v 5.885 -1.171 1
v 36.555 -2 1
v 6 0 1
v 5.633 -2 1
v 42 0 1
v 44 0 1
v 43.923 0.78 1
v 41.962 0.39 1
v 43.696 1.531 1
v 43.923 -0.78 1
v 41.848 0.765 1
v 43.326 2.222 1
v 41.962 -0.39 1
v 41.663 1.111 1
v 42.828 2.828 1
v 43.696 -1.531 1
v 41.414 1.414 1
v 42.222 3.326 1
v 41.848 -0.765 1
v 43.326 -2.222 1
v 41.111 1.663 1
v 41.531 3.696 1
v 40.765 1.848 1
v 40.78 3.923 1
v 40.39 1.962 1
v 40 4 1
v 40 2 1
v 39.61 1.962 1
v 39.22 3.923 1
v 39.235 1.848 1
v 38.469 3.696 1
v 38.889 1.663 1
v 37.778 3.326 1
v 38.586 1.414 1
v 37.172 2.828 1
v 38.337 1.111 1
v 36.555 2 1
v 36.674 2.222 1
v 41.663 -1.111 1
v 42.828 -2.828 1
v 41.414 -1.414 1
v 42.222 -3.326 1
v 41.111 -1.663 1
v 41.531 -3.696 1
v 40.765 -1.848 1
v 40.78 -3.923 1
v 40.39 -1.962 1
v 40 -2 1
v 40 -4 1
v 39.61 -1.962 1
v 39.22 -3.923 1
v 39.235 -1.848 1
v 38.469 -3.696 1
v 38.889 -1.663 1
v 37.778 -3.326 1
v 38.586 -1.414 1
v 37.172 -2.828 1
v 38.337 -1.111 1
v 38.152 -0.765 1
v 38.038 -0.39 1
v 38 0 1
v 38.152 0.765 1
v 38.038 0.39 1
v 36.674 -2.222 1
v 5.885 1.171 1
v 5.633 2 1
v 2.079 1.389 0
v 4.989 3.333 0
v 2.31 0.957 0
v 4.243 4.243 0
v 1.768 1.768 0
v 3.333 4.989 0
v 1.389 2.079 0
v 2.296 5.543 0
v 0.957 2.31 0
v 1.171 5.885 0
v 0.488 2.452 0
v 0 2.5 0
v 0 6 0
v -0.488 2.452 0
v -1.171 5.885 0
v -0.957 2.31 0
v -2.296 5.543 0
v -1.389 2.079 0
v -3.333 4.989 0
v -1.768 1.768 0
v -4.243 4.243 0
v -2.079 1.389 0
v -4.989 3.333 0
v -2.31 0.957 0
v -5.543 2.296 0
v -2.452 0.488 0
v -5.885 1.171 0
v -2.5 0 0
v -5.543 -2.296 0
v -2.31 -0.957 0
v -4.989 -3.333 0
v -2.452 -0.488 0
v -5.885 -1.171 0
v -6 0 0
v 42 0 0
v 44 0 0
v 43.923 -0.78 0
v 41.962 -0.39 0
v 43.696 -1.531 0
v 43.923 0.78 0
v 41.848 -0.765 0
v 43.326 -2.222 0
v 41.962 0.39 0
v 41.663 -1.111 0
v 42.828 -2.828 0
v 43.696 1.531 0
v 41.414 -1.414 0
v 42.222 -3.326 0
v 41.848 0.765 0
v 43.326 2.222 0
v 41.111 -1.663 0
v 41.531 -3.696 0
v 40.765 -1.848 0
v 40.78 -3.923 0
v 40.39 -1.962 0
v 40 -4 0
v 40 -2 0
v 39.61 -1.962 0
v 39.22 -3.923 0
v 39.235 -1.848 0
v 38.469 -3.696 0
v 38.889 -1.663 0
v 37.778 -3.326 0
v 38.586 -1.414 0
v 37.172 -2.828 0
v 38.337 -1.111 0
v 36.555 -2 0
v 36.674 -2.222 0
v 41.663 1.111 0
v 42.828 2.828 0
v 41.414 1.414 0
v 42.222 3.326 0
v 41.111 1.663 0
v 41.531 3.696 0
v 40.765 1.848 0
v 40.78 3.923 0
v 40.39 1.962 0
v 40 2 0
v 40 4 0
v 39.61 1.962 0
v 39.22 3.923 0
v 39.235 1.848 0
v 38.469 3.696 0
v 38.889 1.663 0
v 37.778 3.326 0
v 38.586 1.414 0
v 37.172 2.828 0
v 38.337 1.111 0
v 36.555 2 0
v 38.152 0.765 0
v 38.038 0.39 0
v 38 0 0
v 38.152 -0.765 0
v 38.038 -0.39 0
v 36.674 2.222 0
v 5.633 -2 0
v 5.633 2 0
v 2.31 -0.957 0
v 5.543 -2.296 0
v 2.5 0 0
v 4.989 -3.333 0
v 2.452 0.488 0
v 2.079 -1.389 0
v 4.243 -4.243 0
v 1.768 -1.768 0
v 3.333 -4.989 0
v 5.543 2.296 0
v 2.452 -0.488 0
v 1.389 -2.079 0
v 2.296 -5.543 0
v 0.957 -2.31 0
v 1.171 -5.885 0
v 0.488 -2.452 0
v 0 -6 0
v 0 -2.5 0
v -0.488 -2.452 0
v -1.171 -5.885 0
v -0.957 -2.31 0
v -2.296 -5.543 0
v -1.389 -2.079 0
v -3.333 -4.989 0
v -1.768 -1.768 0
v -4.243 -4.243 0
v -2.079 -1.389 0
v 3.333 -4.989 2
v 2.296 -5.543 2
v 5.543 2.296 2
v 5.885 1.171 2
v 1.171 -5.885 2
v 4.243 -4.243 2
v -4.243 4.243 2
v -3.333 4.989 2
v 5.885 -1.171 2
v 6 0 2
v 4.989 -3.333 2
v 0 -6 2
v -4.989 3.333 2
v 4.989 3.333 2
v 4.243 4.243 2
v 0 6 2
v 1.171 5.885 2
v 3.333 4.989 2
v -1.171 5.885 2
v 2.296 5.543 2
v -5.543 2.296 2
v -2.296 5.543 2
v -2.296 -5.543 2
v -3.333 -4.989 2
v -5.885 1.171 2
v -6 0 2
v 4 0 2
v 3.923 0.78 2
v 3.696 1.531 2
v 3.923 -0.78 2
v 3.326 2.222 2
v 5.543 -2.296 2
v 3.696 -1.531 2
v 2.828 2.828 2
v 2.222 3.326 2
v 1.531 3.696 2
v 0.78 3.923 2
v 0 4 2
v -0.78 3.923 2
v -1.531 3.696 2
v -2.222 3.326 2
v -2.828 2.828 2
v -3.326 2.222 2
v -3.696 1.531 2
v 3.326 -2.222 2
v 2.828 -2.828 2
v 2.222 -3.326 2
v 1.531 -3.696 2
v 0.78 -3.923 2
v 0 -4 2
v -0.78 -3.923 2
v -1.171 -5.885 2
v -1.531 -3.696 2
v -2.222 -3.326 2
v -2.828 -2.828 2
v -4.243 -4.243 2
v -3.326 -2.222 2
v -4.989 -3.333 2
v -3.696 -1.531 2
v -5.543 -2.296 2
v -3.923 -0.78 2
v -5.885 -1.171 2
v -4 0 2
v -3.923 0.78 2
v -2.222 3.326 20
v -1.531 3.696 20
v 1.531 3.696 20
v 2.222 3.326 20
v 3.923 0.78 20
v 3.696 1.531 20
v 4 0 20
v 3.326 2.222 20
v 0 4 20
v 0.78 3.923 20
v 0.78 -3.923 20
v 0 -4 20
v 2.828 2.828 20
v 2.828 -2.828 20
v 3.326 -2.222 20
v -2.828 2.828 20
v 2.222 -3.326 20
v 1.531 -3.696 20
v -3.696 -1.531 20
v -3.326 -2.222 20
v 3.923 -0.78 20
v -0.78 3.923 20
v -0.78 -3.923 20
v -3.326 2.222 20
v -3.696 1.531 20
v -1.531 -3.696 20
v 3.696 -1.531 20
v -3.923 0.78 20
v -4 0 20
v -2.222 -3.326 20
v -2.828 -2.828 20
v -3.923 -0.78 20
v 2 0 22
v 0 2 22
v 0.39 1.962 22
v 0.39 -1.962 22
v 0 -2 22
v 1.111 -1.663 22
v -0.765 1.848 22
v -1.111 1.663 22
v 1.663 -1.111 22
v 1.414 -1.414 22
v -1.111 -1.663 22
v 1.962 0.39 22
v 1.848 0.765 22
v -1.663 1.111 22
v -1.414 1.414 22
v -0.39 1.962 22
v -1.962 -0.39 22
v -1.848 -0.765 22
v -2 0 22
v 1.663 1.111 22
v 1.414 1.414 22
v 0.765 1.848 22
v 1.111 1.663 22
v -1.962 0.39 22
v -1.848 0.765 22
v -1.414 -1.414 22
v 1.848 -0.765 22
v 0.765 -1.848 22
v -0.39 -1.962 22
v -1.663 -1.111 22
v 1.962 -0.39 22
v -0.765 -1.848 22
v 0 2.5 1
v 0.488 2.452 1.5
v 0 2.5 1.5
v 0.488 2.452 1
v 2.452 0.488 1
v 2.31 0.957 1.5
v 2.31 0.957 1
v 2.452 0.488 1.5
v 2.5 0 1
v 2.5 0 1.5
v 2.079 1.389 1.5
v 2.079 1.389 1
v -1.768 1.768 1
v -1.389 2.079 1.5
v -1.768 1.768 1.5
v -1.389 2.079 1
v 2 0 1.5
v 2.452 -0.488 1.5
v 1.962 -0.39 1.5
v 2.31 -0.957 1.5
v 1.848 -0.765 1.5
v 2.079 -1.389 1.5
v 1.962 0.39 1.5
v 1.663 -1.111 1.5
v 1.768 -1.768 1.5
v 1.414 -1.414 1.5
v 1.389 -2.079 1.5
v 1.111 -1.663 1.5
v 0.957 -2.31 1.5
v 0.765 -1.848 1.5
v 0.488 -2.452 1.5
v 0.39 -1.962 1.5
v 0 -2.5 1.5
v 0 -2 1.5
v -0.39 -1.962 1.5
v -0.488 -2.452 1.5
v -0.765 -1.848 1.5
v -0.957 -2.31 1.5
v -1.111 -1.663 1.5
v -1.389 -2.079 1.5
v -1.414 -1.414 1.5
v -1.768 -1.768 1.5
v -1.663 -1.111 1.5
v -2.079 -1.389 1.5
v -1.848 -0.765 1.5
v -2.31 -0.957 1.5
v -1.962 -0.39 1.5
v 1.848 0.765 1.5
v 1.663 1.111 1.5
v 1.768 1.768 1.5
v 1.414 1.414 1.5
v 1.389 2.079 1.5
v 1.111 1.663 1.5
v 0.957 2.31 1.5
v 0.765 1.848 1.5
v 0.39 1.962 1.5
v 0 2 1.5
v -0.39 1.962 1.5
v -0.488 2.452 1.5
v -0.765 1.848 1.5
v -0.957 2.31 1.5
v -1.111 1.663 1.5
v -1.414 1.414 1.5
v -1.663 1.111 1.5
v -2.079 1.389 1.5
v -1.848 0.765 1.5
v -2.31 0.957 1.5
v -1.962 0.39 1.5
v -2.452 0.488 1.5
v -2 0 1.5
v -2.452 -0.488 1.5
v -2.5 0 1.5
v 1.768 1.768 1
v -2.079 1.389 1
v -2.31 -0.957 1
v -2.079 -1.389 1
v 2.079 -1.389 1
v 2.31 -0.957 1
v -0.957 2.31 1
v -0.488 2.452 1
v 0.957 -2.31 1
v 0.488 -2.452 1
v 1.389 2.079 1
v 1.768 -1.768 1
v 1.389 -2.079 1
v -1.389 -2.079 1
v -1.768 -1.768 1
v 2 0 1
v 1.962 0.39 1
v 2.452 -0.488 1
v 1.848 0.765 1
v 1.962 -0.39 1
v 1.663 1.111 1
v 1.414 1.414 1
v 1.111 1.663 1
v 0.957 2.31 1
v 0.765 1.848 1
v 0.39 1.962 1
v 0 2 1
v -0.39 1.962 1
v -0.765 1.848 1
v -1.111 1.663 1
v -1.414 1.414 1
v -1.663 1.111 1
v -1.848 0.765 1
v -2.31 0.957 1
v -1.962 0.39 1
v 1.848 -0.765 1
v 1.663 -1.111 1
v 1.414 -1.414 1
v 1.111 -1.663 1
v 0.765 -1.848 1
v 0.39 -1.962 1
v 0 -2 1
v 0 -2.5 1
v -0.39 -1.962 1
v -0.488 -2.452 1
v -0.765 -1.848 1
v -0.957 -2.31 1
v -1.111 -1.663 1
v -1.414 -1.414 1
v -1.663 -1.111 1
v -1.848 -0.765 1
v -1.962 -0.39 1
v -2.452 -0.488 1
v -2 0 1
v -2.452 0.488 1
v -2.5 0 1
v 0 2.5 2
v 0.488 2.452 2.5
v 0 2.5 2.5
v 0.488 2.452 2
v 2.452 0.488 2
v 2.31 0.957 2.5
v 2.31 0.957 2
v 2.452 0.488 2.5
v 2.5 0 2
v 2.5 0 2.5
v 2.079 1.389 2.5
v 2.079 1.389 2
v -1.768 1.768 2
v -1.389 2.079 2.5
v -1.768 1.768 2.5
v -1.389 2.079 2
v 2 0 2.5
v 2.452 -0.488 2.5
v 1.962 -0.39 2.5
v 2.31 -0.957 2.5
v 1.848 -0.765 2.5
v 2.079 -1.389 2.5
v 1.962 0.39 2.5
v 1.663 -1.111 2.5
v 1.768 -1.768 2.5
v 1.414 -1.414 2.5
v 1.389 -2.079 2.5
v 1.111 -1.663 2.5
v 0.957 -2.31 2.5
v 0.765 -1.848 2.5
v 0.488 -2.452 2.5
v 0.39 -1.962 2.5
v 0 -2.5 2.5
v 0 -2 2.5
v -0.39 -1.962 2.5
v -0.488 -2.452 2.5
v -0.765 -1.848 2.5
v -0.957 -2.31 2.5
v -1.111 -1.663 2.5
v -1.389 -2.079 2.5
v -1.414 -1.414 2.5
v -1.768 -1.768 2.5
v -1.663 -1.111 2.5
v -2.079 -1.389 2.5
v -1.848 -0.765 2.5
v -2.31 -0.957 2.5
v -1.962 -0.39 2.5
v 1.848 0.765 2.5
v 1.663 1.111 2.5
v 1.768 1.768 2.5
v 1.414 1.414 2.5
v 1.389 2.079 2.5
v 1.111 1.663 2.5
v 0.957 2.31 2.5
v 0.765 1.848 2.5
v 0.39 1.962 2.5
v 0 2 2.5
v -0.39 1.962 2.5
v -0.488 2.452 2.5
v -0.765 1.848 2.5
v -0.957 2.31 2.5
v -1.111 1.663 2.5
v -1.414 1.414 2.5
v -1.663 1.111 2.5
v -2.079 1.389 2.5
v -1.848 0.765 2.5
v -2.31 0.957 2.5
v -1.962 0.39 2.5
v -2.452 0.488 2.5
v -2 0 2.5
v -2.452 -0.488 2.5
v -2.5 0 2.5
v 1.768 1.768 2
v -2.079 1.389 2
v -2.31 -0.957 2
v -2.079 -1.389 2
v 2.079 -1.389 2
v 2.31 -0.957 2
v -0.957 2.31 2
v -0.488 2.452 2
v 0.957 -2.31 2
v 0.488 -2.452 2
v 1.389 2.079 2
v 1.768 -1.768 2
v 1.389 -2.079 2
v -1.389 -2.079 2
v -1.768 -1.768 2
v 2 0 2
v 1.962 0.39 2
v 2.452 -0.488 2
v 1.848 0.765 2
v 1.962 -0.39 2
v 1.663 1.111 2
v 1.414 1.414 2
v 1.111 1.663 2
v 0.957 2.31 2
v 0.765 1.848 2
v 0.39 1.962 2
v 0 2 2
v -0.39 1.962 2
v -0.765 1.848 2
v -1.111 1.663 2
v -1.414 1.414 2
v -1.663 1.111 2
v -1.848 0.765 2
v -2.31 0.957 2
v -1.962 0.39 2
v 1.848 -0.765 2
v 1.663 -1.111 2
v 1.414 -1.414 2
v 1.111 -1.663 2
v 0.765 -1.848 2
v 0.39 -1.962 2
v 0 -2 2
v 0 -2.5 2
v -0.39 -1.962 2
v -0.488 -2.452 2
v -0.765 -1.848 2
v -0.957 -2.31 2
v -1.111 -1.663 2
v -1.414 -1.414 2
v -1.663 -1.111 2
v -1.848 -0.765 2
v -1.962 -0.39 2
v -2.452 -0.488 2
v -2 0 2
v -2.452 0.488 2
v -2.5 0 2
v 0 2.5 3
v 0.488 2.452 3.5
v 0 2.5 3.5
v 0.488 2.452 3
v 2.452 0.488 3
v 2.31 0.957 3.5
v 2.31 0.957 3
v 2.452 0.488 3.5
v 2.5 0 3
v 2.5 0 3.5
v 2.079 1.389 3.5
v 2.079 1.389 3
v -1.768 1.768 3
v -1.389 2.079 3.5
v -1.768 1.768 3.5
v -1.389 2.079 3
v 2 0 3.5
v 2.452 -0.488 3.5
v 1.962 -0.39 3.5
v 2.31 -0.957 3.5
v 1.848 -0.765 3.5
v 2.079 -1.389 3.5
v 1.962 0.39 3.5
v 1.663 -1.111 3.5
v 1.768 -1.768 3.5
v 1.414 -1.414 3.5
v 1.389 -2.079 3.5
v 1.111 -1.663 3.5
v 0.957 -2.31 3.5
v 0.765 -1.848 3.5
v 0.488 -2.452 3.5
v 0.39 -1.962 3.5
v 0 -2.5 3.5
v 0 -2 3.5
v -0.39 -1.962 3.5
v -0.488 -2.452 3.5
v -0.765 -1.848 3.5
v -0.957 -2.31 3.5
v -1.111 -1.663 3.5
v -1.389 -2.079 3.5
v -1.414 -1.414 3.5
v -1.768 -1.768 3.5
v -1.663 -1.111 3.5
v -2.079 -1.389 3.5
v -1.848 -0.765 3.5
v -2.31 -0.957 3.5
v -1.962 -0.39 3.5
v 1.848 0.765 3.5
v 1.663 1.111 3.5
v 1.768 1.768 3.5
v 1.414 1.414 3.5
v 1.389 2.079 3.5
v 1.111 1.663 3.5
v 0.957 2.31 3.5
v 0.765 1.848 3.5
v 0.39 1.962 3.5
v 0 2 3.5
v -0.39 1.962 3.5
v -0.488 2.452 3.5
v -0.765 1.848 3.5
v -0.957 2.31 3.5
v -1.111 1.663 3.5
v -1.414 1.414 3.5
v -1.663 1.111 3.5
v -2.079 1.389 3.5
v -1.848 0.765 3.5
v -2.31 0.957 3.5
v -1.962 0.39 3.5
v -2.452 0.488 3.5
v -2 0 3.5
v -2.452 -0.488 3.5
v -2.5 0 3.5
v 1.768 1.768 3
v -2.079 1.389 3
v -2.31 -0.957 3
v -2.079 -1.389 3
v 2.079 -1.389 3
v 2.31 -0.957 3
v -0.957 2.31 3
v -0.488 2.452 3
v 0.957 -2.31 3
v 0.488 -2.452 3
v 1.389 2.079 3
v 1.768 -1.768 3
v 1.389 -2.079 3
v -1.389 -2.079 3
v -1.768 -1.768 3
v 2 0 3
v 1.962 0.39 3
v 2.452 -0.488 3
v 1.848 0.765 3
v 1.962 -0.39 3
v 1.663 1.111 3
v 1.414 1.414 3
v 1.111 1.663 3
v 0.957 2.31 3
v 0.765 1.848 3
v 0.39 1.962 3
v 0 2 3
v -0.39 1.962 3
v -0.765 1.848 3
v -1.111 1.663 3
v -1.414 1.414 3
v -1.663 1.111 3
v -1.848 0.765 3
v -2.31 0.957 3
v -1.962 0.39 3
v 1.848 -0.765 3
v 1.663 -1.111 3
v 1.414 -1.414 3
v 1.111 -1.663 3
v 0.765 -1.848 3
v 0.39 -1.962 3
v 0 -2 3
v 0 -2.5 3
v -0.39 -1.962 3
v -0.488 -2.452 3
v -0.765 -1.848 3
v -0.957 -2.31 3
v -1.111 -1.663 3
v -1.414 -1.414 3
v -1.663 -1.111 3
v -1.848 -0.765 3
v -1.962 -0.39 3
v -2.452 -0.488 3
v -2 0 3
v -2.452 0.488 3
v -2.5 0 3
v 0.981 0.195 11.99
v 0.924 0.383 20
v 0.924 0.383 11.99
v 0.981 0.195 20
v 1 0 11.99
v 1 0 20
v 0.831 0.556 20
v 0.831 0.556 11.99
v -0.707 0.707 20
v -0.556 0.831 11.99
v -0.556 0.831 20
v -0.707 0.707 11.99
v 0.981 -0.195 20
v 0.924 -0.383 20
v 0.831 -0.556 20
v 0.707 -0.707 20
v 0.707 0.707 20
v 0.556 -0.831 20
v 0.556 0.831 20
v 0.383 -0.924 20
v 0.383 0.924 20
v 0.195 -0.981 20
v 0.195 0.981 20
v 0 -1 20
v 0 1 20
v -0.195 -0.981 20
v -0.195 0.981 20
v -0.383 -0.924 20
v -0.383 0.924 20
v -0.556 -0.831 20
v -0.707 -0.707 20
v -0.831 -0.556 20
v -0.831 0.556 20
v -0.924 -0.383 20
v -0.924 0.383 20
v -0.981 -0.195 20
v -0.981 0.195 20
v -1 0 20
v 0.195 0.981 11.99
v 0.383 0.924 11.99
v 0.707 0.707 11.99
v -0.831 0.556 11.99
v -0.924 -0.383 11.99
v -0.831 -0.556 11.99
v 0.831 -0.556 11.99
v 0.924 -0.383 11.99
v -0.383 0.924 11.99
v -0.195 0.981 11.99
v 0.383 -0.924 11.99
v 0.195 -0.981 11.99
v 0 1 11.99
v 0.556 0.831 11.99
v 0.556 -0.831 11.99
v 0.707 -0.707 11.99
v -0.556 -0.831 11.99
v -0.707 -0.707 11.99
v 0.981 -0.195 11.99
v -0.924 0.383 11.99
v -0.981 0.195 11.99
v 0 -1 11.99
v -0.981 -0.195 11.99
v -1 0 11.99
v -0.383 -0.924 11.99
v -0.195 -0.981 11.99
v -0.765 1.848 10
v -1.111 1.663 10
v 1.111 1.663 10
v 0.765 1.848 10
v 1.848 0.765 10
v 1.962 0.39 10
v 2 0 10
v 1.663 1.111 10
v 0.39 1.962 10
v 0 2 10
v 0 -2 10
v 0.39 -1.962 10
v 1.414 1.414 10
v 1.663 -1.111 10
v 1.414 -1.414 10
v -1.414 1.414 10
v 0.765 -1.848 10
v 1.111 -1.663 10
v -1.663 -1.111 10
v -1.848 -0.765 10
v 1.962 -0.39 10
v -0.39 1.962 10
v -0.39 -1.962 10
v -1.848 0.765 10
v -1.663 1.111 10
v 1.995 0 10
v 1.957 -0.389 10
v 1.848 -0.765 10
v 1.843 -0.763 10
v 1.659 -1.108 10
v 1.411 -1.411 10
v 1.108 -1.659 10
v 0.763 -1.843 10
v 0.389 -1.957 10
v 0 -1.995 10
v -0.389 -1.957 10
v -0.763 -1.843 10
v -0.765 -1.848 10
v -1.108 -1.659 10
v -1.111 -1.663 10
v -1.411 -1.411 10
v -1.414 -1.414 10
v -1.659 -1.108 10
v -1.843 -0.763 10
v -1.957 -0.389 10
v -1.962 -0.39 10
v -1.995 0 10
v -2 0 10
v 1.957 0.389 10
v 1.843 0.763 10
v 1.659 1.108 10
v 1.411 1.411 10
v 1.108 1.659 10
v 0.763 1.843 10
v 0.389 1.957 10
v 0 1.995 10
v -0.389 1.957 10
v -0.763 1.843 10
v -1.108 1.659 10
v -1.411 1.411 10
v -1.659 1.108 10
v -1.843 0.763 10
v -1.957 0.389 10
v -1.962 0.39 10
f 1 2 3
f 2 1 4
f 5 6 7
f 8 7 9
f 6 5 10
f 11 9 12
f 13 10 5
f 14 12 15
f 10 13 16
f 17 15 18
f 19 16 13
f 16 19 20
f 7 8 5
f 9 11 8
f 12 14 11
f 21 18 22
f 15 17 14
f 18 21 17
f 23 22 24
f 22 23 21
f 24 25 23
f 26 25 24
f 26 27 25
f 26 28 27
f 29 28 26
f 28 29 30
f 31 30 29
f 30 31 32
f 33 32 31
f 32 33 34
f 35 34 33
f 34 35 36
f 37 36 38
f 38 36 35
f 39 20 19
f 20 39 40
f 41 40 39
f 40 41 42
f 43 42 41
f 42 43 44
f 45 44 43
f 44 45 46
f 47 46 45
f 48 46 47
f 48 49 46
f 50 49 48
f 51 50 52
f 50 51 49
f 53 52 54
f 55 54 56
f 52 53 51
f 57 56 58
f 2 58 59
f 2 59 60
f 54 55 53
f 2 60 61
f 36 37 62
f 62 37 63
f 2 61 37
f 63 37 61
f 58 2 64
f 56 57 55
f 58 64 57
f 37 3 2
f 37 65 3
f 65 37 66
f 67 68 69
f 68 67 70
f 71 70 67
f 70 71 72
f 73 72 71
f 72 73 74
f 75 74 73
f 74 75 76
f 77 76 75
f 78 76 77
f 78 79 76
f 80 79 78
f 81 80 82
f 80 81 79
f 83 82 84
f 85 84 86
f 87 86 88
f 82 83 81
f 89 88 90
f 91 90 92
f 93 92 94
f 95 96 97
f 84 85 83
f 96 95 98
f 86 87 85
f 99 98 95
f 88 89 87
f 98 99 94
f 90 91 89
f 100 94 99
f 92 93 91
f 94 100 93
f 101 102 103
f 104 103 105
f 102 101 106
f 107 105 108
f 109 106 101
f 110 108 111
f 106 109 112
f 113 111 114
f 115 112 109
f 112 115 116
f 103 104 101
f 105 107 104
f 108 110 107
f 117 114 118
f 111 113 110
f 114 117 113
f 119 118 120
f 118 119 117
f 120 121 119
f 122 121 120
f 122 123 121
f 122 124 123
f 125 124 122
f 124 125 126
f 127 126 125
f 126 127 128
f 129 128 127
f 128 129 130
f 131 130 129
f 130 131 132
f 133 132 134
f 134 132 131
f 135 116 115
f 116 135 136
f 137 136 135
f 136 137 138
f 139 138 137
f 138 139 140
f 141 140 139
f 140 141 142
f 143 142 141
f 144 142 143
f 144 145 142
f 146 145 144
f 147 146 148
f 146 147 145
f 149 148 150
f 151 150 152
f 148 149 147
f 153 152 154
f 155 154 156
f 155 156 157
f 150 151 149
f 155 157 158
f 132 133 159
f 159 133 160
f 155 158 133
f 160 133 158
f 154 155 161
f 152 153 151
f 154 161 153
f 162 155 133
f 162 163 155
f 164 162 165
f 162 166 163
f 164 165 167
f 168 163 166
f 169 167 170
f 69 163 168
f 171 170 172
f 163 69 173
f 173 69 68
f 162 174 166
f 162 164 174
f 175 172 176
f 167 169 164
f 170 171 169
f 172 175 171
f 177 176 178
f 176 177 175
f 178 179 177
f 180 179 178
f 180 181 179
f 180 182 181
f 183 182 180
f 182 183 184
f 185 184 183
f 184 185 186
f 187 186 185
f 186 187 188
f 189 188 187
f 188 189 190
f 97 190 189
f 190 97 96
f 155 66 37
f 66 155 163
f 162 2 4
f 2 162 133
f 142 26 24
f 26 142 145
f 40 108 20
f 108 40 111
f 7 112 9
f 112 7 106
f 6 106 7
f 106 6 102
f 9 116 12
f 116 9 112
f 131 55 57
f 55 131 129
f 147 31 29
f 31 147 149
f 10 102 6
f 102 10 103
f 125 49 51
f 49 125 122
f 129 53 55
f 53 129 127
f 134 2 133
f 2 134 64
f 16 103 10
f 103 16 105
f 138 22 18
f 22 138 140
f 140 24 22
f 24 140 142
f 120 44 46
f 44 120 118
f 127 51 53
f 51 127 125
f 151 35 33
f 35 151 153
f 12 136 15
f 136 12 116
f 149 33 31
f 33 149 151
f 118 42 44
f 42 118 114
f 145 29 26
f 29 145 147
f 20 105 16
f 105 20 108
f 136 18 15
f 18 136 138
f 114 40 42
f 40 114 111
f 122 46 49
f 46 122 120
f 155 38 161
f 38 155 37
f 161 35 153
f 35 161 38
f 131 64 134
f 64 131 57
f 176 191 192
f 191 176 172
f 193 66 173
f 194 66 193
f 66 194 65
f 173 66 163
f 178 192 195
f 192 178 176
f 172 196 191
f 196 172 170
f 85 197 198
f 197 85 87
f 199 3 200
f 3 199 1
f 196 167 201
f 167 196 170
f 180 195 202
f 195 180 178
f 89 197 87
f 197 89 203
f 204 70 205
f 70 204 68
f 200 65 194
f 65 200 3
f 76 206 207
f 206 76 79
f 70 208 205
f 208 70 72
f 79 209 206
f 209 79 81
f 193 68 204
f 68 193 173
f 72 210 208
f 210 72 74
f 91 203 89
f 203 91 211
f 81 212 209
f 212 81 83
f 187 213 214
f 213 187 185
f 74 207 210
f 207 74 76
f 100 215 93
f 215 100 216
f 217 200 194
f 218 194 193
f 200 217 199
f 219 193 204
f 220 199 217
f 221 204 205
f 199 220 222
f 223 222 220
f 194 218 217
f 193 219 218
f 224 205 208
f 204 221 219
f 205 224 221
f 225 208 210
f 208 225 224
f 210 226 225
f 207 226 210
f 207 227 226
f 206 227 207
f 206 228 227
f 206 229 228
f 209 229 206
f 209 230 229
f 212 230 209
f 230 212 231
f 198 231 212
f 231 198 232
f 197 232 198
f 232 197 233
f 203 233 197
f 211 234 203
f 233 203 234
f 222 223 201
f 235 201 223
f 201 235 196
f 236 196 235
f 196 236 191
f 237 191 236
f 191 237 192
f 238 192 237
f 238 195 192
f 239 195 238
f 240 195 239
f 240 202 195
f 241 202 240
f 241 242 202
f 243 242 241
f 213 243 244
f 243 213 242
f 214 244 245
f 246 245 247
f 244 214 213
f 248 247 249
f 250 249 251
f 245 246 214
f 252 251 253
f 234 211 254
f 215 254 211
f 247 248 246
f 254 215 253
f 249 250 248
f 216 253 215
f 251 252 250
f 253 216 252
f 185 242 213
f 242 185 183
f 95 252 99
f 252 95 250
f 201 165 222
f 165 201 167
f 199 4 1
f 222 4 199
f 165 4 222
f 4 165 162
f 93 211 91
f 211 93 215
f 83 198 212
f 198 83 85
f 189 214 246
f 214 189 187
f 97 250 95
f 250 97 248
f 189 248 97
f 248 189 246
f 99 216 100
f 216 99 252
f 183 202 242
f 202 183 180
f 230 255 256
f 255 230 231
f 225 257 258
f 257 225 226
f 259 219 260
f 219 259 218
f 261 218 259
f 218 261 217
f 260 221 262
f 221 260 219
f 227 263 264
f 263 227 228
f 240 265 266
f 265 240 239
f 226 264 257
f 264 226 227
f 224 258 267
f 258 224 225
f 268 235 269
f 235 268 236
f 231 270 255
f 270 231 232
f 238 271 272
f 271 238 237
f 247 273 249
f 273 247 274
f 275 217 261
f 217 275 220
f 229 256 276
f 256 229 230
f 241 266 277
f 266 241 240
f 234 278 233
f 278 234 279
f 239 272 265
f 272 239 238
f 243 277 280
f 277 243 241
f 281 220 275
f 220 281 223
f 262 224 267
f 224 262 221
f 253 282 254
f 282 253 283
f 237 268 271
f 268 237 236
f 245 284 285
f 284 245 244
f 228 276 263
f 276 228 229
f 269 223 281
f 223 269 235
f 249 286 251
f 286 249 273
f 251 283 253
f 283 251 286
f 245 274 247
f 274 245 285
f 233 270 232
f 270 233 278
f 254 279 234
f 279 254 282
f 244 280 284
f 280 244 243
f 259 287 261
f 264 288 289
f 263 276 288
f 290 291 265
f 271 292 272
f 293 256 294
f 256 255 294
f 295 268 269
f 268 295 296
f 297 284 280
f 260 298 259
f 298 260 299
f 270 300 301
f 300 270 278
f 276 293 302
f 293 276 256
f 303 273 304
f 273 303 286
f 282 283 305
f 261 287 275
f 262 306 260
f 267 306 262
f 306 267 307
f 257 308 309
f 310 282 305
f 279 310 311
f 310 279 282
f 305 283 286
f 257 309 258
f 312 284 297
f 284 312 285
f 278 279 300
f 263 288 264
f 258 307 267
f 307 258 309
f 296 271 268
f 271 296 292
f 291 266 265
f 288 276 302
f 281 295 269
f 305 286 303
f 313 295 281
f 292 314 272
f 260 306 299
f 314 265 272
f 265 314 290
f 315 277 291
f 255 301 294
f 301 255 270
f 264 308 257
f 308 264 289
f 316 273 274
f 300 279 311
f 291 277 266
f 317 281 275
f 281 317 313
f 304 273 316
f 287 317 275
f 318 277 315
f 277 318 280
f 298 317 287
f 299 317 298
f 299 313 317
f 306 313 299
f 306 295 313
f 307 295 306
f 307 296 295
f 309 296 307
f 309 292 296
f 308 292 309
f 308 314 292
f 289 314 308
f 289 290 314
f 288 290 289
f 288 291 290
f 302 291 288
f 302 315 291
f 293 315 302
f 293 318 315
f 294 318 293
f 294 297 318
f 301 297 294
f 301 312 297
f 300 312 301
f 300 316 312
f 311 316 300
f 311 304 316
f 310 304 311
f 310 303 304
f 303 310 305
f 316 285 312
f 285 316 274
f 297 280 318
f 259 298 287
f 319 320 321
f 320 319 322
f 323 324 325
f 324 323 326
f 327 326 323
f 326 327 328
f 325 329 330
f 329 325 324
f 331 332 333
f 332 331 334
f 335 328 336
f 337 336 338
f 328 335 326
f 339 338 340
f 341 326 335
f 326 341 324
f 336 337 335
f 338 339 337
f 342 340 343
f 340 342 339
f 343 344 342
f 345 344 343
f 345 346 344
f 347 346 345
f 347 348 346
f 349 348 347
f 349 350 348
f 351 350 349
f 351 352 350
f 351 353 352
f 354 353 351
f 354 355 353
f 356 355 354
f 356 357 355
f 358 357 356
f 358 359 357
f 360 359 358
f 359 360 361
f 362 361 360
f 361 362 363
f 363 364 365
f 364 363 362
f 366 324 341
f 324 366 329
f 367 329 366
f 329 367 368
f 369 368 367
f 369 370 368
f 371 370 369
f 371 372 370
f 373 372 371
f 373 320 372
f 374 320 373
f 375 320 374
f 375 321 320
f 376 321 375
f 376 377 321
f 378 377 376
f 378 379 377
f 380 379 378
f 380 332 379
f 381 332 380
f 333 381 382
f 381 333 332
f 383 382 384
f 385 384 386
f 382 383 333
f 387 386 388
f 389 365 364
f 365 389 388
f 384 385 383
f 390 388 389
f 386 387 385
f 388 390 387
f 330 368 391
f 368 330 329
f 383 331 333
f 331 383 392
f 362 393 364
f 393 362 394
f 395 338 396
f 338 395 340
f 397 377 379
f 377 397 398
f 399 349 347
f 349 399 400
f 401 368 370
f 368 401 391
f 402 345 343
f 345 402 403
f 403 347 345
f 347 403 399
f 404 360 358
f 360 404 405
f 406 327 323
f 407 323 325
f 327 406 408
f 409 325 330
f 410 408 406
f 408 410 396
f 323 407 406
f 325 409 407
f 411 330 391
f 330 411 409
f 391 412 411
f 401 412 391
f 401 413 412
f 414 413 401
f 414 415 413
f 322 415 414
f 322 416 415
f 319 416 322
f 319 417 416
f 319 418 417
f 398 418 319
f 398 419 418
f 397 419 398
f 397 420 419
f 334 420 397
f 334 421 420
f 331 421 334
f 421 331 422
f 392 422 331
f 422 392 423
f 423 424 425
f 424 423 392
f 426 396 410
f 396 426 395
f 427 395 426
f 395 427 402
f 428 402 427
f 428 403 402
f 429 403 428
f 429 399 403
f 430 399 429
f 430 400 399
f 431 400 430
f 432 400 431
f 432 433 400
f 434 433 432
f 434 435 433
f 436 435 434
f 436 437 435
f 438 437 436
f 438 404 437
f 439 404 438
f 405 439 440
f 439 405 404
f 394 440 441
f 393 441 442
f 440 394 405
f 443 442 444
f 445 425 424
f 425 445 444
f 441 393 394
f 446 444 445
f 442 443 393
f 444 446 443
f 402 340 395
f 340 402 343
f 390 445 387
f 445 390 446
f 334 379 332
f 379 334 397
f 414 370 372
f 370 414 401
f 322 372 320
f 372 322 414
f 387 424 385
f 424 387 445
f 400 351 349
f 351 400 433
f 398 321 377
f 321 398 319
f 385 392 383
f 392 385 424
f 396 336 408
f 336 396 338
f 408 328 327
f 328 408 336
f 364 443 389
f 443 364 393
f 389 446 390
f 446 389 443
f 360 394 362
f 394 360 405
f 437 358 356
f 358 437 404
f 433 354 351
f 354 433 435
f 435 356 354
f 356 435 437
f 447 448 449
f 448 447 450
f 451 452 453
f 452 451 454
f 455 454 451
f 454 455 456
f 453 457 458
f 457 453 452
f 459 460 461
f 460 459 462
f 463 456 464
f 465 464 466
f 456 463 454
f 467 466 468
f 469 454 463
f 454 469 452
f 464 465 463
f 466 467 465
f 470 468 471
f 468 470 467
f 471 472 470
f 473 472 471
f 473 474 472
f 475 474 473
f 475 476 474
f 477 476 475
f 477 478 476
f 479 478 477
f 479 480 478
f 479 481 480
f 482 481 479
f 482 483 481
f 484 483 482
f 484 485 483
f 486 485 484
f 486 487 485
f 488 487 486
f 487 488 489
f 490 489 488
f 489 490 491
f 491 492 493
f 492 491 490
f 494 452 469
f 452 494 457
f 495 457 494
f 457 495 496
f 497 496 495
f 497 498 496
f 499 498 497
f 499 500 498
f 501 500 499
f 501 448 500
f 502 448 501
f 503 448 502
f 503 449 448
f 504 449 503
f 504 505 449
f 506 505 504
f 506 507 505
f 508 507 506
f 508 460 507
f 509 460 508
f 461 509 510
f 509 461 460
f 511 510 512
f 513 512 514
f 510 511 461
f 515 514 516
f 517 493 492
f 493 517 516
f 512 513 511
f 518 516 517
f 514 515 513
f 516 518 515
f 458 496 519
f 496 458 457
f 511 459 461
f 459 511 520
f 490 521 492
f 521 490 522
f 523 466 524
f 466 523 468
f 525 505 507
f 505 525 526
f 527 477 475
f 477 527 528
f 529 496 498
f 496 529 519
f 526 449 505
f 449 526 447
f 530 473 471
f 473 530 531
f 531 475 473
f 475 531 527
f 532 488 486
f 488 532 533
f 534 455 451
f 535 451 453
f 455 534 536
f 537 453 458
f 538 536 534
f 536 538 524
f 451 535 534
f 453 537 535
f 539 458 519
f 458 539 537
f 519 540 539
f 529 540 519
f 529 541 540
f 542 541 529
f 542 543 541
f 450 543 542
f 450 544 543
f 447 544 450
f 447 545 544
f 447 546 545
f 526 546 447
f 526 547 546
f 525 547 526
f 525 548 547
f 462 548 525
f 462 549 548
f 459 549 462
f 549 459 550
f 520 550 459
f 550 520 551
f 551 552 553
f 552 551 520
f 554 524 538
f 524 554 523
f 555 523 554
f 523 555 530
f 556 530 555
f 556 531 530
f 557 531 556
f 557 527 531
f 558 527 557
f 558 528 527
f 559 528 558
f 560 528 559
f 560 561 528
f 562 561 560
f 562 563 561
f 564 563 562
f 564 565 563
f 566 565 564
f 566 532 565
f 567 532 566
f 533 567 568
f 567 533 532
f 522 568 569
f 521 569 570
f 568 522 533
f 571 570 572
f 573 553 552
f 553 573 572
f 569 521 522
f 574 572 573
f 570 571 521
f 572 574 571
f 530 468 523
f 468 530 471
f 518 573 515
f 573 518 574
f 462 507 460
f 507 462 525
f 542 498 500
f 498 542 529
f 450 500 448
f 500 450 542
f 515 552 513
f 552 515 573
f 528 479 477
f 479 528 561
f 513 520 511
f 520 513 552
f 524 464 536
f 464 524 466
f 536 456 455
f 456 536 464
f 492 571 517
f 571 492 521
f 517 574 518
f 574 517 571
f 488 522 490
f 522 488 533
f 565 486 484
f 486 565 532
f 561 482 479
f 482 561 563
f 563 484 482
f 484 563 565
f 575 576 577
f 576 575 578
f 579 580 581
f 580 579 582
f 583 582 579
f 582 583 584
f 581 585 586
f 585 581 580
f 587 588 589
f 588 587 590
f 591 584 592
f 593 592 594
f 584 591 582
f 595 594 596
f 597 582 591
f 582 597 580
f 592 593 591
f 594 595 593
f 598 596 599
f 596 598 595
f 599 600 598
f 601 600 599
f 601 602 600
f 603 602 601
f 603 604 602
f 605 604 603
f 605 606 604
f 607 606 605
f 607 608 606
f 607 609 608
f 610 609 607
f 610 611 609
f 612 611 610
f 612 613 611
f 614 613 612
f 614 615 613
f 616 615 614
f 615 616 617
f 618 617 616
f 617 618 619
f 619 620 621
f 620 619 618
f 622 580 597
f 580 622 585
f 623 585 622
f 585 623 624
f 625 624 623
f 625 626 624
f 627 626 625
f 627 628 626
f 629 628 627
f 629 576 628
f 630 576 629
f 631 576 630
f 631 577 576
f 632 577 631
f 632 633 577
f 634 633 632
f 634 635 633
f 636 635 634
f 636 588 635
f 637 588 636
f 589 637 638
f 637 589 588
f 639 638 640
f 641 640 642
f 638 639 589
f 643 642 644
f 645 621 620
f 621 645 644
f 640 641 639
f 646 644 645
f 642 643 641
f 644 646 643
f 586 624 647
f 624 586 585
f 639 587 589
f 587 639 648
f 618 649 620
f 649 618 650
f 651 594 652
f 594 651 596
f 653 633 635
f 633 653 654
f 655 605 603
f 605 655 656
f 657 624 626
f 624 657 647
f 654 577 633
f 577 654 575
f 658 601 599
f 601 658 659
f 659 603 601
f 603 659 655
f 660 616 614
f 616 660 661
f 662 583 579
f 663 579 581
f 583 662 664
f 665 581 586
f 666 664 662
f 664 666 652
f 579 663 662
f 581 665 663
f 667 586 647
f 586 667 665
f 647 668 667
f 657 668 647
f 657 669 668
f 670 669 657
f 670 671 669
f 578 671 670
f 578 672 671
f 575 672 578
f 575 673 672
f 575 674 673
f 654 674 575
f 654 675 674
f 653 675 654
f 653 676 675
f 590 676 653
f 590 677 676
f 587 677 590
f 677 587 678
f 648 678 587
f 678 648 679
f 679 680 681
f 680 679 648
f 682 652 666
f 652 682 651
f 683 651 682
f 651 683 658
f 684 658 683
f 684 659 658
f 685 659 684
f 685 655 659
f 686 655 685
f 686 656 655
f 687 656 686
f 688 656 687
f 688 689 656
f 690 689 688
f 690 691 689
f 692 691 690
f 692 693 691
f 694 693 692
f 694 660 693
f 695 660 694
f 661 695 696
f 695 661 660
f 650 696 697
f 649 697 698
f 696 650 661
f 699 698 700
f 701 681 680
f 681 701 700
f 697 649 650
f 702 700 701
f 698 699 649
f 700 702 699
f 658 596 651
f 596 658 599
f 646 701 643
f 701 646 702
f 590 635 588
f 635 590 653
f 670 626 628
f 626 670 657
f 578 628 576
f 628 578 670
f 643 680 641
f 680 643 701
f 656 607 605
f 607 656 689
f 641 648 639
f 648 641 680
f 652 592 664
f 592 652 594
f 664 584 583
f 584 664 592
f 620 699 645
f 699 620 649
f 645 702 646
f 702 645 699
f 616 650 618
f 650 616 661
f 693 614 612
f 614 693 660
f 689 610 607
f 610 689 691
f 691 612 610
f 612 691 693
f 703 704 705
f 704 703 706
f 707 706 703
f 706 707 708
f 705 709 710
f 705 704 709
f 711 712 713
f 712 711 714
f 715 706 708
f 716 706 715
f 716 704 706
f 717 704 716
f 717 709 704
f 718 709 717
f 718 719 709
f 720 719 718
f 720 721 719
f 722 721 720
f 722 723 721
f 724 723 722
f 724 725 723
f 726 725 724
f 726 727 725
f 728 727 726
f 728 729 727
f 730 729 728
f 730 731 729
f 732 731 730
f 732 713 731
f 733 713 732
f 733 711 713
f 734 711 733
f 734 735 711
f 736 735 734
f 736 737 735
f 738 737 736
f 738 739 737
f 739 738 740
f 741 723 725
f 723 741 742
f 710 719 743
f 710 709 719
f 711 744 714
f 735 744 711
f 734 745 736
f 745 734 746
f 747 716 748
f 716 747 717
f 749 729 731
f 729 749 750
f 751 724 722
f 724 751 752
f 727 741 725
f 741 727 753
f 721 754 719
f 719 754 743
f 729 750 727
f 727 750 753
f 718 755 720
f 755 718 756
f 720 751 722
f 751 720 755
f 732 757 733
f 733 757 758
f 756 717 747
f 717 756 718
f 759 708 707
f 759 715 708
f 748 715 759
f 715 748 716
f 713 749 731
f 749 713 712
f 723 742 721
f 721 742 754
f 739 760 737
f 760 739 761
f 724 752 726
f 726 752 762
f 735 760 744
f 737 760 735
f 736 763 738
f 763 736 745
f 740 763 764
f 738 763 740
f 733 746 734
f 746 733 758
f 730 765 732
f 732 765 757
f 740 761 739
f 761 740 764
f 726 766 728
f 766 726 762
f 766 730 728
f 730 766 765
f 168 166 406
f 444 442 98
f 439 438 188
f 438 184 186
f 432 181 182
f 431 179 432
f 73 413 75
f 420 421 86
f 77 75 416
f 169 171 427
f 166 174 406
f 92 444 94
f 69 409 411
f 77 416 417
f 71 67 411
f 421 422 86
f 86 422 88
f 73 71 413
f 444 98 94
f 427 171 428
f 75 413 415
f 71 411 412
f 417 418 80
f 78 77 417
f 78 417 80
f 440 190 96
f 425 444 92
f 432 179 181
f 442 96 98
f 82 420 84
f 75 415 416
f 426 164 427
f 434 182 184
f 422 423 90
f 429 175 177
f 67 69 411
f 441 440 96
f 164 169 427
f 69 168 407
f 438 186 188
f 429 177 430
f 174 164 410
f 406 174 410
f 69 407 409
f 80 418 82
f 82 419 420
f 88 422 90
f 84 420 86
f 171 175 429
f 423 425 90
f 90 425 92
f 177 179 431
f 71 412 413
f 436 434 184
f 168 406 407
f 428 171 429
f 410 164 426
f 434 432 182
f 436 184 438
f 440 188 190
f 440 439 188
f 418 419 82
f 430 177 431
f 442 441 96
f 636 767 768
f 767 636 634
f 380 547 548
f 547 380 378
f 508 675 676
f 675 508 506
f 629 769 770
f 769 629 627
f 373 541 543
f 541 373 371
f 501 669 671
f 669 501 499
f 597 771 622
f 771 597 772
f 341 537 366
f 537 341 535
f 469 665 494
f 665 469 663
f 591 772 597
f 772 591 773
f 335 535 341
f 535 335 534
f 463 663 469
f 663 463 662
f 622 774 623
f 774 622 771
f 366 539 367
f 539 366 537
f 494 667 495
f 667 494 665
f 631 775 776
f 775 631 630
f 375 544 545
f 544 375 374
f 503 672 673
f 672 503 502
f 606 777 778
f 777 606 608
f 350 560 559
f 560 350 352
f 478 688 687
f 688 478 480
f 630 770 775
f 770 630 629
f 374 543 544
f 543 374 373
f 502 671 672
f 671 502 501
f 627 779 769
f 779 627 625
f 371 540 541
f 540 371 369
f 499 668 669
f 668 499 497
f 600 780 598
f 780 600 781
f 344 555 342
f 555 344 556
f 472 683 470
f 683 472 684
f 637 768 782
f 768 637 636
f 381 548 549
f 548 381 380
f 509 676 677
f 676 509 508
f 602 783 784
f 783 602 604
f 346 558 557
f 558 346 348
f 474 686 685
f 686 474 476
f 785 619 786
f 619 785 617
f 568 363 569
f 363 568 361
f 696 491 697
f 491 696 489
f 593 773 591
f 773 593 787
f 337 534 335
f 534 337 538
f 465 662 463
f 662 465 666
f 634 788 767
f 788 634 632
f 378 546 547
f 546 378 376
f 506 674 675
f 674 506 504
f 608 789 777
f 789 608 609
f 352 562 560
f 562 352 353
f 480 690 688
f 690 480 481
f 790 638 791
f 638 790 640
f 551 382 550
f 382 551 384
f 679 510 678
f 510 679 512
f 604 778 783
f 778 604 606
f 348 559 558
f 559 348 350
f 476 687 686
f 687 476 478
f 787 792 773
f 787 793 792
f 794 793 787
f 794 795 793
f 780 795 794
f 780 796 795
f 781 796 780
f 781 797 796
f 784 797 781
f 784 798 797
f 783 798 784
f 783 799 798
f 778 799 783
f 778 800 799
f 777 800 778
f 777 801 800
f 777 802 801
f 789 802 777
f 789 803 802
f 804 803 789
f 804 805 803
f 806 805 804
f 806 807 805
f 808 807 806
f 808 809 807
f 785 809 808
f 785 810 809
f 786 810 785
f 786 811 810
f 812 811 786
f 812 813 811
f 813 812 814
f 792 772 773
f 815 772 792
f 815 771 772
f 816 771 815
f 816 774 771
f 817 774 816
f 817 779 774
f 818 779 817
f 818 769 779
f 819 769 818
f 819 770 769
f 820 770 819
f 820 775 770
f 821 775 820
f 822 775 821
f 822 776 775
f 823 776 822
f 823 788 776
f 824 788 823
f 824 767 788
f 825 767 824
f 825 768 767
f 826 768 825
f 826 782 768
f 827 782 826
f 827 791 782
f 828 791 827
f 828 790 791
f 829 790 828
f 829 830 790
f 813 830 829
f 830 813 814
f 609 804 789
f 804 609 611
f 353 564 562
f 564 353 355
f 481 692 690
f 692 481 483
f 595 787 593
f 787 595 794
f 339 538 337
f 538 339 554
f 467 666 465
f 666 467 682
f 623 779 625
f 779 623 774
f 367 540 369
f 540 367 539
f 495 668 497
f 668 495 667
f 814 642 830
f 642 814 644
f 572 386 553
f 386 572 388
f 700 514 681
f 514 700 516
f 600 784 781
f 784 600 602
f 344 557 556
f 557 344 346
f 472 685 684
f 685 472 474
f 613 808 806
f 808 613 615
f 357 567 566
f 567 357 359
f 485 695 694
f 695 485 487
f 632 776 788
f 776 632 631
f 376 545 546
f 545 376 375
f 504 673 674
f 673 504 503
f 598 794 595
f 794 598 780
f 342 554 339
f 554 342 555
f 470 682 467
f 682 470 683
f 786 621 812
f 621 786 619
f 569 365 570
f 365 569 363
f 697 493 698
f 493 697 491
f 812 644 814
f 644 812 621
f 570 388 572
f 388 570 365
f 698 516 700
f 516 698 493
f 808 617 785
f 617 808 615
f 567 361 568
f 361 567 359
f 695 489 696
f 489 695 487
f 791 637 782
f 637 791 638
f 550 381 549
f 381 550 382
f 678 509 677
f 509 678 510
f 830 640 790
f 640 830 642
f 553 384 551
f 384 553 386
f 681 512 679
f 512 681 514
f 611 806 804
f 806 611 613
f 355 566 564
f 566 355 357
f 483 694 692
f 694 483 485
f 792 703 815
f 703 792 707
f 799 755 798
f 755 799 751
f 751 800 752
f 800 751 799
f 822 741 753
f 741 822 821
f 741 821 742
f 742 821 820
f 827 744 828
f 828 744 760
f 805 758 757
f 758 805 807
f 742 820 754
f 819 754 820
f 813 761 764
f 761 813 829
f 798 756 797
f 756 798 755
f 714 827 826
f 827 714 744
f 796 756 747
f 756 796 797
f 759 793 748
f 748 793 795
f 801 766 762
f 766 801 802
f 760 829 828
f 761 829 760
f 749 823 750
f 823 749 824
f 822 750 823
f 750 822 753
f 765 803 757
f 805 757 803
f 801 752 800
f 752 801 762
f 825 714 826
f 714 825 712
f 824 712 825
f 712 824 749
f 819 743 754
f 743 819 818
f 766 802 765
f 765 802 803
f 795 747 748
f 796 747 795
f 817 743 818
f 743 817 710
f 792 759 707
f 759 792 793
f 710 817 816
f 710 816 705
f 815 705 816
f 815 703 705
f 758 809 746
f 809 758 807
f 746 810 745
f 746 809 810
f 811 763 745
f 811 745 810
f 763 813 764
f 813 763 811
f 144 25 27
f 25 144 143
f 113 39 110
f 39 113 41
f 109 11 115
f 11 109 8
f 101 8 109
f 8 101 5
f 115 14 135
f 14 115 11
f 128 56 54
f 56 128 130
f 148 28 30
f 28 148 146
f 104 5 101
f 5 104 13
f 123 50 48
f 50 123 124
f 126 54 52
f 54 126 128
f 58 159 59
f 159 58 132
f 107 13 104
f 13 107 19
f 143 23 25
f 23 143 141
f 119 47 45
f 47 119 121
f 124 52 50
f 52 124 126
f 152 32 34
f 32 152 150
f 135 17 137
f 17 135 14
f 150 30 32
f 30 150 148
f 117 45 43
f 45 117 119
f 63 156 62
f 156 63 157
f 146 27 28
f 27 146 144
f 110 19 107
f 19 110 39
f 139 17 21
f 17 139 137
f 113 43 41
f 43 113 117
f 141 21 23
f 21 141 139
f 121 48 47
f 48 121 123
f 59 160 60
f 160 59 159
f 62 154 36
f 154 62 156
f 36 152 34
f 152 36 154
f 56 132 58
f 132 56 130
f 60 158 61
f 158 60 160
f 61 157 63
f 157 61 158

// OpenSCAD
/**
* PTFE Tube Plug for plugging the ends of PTFE tubes, or any tube, really.

* @author Brian Alano
* @license This software is licensed by Brian Alano under the Creative Commons 4.0 Attribution, Non-Commercial, Share-Alike license CC BY-NC-SA 4.0
    https://creativecommons.org/licenses/by-nc-sa/4.0/    
* @requires OpenSCAD version 2019.05
* @since 2019-07-14
* @version 1.0
*/
/* [Basic] */
//PTFE tube inner diameter
tube_id = 2.0; // [0.0 : 0.1 : 25.0]
//PTFE tube outer diameter
tube_od = 4.0; //[2.0 : 0.05 : 25.0]
//Include a lanyard?
lanyard = "yes"; //[no, yes]
//Preview in cutaway view?
cutaway = "no"; //[no, yes]
/* [Cap] */
wall_thickness = 2.0; //[0.2 : 0.1 : 25.0]
tube_depth = 10.0; //[0.0 : 0.1 : 25.0]
filament_depth = 10.0; // [0.0 : 0.1 : 25.0]
lip_height = 2.0; // [0.0 : 0.1 : 25.0]
lip_width = 2.0; // [0.0 : 0.1 : 25.0]
// Ribs may help grip PTFE if printed with flexible filament
ribs = "yes"; //[no, yes]
/* [Lanyard] */
lanyard_width = 4.0; // [0.1 : 0.1: 8.0]
lanyard_length = 40; // [1 : 100]
// The more brittle your filament, the thinner the lanyard should be
lanyard_thickness = 1.0; //[0.1 : 0.1 : 3.0]
/* [Rendering] */
//Higher is more round, but slower to generate
$fn=32;

/* [Hidden] */
epsilon = 0.01;

main();

module add() {
    cap_height = tube_depth + filament_depth;
    cap_od = tube_od + wall_thickness*2;
    lip_od = cap_od + lip_width*2;
    
    // lip
    cylinder(h=lip_height, d=lip_od);
    // main cap
    cylinder(h=cap_height, d=cap_od);
    // top chamfer
    translate([0, 0, cap_height]) cylinder(h=wall_thickness, d1=cap_od, d2=cap_od - wall_thickness*2 );
    // lanyard
    if (lanyard == "yes") {
        translate([0, -lanyard_width/2, 0]) cube([lanyard_length, lanyard_width, lanyard_thickness]); 
        translate([lanyard_length, 0, ,0]) cylinder(h=lanyard_thickness, d = cap_od);
    }
}

module subtract() {
    // tube cutout
    cylinder(h=tube_depth + filament_depth, d=tube_id);
    // chamfer the tube hole
    cylinder(h=wall_thickness/2, d1=tube_od + wall_thickness/2, d2 = tube_od);
    // filament cutout
    translate([0,0,-epsilon]) cylinder(h=tube_depth + epsilon, d=tube_od);
    // chamfer the filament hole
    translate([0, 0, tube_depth-epsilon])     cylinder(h=tube_od, d1=tube_od, d2 = 0);
    // ribs
    if (ribs == "yes") {
        for(i=[wall_thickness/2:wall_thickness/2:wall_thickness*1.5]) {
            translate([0, 0, i]) cylinder(h=wall_thickness/4, d=tube_od + wall_thickness/2);
        }
    }
    // lanyard cutout
   translate([lanyard_length, 0, -epsilon]) cylinder(h=lanyard_thickness + epsilon*2, d=tube_od);
    // cutaway preview
    if (cutaway == "yes") {
        translate([0, -25, -epsilon]) cube([200, 50, 100], center=true);
    }
}

module main() {
    difference() {
        add();
        subtract();
    }
}
